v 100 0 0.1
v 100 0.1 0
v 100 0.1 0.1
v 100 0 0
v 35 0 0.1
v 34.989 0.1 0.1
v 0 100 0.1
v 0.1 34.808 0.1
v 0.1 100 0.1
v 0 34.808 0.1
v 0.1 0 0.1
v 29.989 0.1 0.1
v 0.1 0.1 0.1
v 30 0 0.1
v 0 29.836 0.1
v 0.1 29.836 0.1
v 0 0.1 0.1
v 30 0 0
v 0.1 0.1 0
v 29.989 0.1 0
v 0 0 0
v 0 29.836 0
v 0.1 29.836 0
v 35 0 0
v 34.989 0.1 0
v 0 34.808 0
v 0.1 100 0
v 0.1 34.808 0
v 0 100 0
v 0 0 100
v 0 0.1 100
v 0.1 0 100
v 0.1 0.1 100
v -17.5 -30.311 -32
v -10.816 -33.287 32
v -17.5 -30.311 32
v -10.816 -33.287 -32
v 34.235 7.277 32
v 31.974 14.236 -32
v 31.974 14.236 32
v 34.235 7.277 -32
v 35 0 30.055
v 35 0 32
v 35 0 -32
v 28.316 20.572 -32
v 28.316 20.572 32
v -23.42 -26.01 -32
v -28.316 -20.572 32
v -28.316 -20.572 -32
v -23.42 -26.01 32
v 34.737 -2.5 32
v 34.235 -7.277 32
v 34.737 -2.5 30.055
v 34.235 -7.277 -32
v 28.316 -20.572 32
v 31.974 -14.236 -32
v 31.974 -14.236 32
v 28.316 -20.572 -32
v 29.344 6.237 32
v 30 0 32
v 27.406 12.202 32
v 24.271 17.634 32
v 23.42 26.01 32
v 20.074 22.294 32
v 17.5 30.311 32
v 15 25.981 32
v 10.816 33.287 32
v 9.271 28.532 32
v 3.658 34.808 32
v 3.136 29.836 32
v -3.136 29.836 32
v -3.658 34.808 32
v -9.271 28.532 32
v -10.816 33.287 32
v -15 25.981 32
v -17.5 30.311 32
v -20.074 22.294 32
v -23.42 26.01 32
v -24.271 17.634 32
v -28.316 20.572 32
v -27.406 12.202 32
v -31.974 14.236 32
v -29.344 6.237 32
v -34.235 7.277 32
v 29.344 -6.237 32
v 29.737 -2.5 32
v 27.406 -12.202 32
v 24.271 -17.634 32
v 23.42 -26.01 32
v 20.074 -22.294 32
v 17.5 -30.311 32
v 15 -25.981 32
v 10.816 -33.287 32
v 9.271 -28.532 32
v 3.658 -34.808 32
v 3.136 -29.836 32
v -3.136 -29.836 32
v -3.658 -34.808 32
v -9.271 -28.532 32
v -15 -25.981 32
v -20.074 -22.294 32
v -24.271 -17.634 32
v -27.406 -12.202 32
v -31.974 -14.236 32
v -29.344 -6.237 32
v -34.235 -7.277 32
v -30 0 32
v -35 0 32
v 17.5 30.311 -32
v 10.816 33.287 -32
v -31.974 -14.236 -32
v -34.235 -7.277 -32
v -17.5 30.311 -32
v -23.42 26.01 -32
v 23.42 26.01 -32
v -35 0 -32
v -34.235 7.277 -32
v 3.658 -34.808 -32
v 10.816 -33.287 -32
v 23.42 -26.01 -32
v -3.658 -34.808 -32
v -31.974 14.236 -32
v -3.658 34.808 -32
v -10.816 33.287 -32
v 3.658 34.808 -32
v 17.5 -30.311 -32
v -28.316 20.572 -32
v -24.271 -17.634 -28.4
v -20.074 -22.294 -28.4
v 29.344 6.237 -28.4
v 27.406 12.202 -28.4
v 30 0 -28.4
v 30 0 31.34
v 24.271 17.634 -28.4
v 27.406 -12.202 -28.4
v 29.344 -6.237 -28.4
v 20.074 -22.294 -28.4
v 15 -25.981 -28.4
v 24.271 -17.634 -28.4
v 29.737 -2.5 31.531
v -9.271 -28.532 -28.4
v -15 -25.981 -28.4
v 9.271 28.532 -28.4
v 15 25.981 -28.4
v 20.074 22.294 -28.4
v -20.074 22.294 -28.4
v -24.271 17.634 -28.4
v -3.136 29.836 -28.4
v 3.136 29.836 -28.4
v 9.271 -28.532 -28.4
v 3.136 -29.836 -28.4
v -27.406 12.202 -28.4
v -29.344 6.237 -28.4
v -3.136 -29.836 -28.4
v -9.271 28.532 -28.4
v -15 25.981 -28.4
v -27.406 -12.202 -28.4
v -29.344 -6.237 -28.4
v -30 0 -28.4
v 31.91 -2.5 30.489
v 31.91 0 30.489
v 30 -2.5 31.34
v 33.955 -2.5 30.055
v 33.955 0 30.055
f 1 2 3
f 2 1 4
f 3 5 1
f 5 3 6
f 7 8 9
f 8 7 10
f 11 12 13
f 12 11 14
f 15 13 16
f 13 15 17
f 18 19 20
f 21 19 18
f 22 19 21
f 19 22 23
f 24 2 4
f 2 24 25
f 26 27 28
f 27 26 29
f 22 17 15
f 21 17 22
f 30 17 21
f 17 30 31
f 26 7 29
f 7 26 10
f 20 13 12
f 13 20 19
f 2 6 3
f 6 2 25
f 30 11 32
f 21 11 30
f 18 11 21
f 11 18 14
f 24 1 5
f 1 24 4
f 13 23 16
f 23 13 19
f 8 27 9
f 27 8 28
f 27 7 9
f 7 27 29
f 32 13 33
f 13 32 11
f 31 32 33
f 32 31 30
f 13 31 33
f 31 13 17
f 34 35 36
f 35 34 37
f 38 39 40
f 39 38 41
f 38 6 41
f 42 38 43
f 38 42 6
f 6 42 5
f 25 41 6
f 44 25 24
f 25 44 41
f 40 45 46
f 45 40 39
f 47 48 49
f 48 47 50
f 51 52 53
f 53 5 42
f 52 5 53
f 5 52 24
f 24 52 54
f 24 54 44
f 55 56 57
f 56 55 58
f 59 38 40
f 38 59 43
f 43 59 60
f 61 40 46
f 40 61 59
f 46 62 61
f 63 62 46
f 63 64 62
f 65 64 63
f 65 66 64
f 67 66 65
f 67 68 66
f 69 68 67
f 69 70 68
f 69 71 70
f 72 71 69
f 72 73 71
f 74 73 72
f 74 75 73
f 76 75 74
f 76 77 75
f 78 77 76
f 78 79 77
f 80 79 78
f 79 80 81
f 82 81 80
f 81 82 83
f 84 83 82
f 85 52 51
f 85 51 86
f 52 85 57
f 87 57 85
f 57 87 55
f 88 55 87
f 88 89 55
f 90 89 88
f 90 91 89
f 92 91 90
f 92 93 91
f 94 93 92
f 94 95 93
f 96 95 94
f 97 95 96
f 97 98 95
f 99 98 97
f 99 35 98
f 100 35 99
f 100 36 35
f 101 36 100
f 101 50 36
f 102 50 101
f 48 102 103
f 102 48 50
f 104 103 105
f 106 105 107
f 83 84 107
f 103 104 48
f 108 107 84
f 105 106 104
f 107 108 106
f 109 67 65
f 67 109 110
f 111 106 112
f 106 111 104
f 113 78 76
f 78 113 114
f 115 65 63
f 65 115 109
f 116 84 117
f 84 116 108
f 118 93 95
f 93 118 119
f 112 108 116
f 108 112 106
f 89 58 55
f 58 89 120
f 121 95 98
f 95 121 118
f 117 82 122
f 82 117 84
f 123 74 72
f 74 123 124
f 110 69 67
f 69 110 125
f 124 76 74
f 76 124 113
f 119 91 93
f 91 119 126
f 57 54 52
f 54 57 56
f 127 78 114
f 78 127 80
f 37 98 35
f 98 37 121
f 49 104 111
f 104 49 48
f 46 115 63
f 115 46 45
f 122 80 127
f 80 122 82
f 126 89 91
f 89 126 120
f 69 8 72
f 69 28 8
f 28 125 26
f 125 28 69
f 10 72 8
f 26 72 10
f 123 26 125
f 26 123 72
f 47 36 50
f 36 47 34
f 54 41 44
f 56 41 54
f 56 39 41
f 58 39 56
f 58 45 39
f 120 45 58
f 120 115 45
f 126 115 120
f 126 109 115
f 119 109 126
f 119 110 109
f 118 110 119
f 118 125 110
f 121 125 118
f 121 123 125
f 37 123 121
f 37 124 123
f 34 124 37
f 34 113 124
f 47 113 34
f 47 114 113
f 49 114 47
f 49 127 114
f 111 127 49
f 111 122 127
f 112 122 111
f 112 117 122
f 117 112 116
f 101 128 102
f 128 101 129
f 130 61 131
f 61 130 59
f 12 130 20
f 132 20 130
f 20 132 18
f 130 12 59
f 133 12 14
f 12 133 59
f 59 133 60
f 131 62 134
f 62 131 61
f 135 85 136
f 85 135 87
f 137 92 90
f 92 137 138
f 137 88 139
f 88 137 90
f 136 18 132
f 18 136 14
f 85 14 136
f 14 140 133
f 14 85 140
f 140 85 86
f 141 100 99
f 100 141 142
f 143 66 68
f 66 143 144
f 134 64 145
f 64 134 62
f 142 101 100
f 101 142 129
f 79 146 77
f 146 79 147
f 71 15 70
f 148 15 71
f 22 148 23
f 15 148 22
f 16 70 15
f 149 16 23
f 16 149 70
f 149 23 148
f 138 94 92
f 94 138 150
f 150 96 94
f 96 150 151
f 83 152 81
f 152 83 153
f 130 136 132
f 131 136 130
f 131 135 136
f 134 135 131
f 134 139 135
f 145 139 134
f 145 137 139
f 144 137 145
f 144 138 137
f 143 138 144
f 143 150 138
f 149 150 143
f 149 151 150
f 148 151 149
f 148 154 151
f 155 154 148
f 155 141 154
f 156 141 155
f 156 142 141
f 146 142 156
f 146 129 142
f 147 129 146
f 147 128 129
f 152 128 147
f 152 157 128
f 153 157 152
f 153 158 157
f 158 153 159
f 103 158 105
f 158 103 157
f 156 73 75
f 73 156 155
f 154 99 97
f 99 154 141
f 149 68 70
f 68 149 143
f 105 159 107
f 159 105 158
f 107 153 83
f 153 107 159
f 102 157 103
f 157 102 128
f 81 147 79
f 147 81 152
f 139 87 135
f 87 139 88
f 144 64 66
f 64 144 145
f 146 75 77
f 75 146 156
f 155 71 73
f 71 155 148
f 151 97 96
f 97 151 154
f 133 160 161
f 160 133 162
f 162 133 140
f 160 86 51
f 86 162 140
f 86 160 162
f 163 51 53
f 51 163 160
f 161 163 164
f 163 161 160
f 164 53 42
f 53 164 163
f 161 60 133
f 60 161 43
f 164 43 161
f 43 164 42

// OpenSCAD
    // Combined Scene

    // Permanent Model
    
    // Permanent Model (Black)
    color([0, 0, 0]) {
        // Your permanent model code here
        cube([100,0.1,0.1], center = false);
        cube([0.1,100,0.1], center = false);
        cube([0.1,0.1,100], center = false);
    }
    

    // Dynamic Model
    difference() {
    // Main body of the mug with wider top and narrower base
    difference() {
        scale([1, 1, 0.8])
            cylinder(h=80, r=35, center=true); // Outer cylinder
        
        translate([0, 0, 2])
            scale([1, 1, 0.8])
                cylinder(h=76, r=30, center=true); // Inner cylinder for hollow space
    }
    
    // Handle of the mug
    translate([35, 0, 40])
        rotate([90, 0, 0])
            difference() {
                scale([1, 1, 0.5])
                    cylinder(h=10, r=10, center=true); // Outer part of handle
                
                translate([-5, -5, -5])
                    scale([1, 1, 0.5])
                        cylinder(h=20, r=10, center=true); // Inner cutout of handle
            }
}
    
